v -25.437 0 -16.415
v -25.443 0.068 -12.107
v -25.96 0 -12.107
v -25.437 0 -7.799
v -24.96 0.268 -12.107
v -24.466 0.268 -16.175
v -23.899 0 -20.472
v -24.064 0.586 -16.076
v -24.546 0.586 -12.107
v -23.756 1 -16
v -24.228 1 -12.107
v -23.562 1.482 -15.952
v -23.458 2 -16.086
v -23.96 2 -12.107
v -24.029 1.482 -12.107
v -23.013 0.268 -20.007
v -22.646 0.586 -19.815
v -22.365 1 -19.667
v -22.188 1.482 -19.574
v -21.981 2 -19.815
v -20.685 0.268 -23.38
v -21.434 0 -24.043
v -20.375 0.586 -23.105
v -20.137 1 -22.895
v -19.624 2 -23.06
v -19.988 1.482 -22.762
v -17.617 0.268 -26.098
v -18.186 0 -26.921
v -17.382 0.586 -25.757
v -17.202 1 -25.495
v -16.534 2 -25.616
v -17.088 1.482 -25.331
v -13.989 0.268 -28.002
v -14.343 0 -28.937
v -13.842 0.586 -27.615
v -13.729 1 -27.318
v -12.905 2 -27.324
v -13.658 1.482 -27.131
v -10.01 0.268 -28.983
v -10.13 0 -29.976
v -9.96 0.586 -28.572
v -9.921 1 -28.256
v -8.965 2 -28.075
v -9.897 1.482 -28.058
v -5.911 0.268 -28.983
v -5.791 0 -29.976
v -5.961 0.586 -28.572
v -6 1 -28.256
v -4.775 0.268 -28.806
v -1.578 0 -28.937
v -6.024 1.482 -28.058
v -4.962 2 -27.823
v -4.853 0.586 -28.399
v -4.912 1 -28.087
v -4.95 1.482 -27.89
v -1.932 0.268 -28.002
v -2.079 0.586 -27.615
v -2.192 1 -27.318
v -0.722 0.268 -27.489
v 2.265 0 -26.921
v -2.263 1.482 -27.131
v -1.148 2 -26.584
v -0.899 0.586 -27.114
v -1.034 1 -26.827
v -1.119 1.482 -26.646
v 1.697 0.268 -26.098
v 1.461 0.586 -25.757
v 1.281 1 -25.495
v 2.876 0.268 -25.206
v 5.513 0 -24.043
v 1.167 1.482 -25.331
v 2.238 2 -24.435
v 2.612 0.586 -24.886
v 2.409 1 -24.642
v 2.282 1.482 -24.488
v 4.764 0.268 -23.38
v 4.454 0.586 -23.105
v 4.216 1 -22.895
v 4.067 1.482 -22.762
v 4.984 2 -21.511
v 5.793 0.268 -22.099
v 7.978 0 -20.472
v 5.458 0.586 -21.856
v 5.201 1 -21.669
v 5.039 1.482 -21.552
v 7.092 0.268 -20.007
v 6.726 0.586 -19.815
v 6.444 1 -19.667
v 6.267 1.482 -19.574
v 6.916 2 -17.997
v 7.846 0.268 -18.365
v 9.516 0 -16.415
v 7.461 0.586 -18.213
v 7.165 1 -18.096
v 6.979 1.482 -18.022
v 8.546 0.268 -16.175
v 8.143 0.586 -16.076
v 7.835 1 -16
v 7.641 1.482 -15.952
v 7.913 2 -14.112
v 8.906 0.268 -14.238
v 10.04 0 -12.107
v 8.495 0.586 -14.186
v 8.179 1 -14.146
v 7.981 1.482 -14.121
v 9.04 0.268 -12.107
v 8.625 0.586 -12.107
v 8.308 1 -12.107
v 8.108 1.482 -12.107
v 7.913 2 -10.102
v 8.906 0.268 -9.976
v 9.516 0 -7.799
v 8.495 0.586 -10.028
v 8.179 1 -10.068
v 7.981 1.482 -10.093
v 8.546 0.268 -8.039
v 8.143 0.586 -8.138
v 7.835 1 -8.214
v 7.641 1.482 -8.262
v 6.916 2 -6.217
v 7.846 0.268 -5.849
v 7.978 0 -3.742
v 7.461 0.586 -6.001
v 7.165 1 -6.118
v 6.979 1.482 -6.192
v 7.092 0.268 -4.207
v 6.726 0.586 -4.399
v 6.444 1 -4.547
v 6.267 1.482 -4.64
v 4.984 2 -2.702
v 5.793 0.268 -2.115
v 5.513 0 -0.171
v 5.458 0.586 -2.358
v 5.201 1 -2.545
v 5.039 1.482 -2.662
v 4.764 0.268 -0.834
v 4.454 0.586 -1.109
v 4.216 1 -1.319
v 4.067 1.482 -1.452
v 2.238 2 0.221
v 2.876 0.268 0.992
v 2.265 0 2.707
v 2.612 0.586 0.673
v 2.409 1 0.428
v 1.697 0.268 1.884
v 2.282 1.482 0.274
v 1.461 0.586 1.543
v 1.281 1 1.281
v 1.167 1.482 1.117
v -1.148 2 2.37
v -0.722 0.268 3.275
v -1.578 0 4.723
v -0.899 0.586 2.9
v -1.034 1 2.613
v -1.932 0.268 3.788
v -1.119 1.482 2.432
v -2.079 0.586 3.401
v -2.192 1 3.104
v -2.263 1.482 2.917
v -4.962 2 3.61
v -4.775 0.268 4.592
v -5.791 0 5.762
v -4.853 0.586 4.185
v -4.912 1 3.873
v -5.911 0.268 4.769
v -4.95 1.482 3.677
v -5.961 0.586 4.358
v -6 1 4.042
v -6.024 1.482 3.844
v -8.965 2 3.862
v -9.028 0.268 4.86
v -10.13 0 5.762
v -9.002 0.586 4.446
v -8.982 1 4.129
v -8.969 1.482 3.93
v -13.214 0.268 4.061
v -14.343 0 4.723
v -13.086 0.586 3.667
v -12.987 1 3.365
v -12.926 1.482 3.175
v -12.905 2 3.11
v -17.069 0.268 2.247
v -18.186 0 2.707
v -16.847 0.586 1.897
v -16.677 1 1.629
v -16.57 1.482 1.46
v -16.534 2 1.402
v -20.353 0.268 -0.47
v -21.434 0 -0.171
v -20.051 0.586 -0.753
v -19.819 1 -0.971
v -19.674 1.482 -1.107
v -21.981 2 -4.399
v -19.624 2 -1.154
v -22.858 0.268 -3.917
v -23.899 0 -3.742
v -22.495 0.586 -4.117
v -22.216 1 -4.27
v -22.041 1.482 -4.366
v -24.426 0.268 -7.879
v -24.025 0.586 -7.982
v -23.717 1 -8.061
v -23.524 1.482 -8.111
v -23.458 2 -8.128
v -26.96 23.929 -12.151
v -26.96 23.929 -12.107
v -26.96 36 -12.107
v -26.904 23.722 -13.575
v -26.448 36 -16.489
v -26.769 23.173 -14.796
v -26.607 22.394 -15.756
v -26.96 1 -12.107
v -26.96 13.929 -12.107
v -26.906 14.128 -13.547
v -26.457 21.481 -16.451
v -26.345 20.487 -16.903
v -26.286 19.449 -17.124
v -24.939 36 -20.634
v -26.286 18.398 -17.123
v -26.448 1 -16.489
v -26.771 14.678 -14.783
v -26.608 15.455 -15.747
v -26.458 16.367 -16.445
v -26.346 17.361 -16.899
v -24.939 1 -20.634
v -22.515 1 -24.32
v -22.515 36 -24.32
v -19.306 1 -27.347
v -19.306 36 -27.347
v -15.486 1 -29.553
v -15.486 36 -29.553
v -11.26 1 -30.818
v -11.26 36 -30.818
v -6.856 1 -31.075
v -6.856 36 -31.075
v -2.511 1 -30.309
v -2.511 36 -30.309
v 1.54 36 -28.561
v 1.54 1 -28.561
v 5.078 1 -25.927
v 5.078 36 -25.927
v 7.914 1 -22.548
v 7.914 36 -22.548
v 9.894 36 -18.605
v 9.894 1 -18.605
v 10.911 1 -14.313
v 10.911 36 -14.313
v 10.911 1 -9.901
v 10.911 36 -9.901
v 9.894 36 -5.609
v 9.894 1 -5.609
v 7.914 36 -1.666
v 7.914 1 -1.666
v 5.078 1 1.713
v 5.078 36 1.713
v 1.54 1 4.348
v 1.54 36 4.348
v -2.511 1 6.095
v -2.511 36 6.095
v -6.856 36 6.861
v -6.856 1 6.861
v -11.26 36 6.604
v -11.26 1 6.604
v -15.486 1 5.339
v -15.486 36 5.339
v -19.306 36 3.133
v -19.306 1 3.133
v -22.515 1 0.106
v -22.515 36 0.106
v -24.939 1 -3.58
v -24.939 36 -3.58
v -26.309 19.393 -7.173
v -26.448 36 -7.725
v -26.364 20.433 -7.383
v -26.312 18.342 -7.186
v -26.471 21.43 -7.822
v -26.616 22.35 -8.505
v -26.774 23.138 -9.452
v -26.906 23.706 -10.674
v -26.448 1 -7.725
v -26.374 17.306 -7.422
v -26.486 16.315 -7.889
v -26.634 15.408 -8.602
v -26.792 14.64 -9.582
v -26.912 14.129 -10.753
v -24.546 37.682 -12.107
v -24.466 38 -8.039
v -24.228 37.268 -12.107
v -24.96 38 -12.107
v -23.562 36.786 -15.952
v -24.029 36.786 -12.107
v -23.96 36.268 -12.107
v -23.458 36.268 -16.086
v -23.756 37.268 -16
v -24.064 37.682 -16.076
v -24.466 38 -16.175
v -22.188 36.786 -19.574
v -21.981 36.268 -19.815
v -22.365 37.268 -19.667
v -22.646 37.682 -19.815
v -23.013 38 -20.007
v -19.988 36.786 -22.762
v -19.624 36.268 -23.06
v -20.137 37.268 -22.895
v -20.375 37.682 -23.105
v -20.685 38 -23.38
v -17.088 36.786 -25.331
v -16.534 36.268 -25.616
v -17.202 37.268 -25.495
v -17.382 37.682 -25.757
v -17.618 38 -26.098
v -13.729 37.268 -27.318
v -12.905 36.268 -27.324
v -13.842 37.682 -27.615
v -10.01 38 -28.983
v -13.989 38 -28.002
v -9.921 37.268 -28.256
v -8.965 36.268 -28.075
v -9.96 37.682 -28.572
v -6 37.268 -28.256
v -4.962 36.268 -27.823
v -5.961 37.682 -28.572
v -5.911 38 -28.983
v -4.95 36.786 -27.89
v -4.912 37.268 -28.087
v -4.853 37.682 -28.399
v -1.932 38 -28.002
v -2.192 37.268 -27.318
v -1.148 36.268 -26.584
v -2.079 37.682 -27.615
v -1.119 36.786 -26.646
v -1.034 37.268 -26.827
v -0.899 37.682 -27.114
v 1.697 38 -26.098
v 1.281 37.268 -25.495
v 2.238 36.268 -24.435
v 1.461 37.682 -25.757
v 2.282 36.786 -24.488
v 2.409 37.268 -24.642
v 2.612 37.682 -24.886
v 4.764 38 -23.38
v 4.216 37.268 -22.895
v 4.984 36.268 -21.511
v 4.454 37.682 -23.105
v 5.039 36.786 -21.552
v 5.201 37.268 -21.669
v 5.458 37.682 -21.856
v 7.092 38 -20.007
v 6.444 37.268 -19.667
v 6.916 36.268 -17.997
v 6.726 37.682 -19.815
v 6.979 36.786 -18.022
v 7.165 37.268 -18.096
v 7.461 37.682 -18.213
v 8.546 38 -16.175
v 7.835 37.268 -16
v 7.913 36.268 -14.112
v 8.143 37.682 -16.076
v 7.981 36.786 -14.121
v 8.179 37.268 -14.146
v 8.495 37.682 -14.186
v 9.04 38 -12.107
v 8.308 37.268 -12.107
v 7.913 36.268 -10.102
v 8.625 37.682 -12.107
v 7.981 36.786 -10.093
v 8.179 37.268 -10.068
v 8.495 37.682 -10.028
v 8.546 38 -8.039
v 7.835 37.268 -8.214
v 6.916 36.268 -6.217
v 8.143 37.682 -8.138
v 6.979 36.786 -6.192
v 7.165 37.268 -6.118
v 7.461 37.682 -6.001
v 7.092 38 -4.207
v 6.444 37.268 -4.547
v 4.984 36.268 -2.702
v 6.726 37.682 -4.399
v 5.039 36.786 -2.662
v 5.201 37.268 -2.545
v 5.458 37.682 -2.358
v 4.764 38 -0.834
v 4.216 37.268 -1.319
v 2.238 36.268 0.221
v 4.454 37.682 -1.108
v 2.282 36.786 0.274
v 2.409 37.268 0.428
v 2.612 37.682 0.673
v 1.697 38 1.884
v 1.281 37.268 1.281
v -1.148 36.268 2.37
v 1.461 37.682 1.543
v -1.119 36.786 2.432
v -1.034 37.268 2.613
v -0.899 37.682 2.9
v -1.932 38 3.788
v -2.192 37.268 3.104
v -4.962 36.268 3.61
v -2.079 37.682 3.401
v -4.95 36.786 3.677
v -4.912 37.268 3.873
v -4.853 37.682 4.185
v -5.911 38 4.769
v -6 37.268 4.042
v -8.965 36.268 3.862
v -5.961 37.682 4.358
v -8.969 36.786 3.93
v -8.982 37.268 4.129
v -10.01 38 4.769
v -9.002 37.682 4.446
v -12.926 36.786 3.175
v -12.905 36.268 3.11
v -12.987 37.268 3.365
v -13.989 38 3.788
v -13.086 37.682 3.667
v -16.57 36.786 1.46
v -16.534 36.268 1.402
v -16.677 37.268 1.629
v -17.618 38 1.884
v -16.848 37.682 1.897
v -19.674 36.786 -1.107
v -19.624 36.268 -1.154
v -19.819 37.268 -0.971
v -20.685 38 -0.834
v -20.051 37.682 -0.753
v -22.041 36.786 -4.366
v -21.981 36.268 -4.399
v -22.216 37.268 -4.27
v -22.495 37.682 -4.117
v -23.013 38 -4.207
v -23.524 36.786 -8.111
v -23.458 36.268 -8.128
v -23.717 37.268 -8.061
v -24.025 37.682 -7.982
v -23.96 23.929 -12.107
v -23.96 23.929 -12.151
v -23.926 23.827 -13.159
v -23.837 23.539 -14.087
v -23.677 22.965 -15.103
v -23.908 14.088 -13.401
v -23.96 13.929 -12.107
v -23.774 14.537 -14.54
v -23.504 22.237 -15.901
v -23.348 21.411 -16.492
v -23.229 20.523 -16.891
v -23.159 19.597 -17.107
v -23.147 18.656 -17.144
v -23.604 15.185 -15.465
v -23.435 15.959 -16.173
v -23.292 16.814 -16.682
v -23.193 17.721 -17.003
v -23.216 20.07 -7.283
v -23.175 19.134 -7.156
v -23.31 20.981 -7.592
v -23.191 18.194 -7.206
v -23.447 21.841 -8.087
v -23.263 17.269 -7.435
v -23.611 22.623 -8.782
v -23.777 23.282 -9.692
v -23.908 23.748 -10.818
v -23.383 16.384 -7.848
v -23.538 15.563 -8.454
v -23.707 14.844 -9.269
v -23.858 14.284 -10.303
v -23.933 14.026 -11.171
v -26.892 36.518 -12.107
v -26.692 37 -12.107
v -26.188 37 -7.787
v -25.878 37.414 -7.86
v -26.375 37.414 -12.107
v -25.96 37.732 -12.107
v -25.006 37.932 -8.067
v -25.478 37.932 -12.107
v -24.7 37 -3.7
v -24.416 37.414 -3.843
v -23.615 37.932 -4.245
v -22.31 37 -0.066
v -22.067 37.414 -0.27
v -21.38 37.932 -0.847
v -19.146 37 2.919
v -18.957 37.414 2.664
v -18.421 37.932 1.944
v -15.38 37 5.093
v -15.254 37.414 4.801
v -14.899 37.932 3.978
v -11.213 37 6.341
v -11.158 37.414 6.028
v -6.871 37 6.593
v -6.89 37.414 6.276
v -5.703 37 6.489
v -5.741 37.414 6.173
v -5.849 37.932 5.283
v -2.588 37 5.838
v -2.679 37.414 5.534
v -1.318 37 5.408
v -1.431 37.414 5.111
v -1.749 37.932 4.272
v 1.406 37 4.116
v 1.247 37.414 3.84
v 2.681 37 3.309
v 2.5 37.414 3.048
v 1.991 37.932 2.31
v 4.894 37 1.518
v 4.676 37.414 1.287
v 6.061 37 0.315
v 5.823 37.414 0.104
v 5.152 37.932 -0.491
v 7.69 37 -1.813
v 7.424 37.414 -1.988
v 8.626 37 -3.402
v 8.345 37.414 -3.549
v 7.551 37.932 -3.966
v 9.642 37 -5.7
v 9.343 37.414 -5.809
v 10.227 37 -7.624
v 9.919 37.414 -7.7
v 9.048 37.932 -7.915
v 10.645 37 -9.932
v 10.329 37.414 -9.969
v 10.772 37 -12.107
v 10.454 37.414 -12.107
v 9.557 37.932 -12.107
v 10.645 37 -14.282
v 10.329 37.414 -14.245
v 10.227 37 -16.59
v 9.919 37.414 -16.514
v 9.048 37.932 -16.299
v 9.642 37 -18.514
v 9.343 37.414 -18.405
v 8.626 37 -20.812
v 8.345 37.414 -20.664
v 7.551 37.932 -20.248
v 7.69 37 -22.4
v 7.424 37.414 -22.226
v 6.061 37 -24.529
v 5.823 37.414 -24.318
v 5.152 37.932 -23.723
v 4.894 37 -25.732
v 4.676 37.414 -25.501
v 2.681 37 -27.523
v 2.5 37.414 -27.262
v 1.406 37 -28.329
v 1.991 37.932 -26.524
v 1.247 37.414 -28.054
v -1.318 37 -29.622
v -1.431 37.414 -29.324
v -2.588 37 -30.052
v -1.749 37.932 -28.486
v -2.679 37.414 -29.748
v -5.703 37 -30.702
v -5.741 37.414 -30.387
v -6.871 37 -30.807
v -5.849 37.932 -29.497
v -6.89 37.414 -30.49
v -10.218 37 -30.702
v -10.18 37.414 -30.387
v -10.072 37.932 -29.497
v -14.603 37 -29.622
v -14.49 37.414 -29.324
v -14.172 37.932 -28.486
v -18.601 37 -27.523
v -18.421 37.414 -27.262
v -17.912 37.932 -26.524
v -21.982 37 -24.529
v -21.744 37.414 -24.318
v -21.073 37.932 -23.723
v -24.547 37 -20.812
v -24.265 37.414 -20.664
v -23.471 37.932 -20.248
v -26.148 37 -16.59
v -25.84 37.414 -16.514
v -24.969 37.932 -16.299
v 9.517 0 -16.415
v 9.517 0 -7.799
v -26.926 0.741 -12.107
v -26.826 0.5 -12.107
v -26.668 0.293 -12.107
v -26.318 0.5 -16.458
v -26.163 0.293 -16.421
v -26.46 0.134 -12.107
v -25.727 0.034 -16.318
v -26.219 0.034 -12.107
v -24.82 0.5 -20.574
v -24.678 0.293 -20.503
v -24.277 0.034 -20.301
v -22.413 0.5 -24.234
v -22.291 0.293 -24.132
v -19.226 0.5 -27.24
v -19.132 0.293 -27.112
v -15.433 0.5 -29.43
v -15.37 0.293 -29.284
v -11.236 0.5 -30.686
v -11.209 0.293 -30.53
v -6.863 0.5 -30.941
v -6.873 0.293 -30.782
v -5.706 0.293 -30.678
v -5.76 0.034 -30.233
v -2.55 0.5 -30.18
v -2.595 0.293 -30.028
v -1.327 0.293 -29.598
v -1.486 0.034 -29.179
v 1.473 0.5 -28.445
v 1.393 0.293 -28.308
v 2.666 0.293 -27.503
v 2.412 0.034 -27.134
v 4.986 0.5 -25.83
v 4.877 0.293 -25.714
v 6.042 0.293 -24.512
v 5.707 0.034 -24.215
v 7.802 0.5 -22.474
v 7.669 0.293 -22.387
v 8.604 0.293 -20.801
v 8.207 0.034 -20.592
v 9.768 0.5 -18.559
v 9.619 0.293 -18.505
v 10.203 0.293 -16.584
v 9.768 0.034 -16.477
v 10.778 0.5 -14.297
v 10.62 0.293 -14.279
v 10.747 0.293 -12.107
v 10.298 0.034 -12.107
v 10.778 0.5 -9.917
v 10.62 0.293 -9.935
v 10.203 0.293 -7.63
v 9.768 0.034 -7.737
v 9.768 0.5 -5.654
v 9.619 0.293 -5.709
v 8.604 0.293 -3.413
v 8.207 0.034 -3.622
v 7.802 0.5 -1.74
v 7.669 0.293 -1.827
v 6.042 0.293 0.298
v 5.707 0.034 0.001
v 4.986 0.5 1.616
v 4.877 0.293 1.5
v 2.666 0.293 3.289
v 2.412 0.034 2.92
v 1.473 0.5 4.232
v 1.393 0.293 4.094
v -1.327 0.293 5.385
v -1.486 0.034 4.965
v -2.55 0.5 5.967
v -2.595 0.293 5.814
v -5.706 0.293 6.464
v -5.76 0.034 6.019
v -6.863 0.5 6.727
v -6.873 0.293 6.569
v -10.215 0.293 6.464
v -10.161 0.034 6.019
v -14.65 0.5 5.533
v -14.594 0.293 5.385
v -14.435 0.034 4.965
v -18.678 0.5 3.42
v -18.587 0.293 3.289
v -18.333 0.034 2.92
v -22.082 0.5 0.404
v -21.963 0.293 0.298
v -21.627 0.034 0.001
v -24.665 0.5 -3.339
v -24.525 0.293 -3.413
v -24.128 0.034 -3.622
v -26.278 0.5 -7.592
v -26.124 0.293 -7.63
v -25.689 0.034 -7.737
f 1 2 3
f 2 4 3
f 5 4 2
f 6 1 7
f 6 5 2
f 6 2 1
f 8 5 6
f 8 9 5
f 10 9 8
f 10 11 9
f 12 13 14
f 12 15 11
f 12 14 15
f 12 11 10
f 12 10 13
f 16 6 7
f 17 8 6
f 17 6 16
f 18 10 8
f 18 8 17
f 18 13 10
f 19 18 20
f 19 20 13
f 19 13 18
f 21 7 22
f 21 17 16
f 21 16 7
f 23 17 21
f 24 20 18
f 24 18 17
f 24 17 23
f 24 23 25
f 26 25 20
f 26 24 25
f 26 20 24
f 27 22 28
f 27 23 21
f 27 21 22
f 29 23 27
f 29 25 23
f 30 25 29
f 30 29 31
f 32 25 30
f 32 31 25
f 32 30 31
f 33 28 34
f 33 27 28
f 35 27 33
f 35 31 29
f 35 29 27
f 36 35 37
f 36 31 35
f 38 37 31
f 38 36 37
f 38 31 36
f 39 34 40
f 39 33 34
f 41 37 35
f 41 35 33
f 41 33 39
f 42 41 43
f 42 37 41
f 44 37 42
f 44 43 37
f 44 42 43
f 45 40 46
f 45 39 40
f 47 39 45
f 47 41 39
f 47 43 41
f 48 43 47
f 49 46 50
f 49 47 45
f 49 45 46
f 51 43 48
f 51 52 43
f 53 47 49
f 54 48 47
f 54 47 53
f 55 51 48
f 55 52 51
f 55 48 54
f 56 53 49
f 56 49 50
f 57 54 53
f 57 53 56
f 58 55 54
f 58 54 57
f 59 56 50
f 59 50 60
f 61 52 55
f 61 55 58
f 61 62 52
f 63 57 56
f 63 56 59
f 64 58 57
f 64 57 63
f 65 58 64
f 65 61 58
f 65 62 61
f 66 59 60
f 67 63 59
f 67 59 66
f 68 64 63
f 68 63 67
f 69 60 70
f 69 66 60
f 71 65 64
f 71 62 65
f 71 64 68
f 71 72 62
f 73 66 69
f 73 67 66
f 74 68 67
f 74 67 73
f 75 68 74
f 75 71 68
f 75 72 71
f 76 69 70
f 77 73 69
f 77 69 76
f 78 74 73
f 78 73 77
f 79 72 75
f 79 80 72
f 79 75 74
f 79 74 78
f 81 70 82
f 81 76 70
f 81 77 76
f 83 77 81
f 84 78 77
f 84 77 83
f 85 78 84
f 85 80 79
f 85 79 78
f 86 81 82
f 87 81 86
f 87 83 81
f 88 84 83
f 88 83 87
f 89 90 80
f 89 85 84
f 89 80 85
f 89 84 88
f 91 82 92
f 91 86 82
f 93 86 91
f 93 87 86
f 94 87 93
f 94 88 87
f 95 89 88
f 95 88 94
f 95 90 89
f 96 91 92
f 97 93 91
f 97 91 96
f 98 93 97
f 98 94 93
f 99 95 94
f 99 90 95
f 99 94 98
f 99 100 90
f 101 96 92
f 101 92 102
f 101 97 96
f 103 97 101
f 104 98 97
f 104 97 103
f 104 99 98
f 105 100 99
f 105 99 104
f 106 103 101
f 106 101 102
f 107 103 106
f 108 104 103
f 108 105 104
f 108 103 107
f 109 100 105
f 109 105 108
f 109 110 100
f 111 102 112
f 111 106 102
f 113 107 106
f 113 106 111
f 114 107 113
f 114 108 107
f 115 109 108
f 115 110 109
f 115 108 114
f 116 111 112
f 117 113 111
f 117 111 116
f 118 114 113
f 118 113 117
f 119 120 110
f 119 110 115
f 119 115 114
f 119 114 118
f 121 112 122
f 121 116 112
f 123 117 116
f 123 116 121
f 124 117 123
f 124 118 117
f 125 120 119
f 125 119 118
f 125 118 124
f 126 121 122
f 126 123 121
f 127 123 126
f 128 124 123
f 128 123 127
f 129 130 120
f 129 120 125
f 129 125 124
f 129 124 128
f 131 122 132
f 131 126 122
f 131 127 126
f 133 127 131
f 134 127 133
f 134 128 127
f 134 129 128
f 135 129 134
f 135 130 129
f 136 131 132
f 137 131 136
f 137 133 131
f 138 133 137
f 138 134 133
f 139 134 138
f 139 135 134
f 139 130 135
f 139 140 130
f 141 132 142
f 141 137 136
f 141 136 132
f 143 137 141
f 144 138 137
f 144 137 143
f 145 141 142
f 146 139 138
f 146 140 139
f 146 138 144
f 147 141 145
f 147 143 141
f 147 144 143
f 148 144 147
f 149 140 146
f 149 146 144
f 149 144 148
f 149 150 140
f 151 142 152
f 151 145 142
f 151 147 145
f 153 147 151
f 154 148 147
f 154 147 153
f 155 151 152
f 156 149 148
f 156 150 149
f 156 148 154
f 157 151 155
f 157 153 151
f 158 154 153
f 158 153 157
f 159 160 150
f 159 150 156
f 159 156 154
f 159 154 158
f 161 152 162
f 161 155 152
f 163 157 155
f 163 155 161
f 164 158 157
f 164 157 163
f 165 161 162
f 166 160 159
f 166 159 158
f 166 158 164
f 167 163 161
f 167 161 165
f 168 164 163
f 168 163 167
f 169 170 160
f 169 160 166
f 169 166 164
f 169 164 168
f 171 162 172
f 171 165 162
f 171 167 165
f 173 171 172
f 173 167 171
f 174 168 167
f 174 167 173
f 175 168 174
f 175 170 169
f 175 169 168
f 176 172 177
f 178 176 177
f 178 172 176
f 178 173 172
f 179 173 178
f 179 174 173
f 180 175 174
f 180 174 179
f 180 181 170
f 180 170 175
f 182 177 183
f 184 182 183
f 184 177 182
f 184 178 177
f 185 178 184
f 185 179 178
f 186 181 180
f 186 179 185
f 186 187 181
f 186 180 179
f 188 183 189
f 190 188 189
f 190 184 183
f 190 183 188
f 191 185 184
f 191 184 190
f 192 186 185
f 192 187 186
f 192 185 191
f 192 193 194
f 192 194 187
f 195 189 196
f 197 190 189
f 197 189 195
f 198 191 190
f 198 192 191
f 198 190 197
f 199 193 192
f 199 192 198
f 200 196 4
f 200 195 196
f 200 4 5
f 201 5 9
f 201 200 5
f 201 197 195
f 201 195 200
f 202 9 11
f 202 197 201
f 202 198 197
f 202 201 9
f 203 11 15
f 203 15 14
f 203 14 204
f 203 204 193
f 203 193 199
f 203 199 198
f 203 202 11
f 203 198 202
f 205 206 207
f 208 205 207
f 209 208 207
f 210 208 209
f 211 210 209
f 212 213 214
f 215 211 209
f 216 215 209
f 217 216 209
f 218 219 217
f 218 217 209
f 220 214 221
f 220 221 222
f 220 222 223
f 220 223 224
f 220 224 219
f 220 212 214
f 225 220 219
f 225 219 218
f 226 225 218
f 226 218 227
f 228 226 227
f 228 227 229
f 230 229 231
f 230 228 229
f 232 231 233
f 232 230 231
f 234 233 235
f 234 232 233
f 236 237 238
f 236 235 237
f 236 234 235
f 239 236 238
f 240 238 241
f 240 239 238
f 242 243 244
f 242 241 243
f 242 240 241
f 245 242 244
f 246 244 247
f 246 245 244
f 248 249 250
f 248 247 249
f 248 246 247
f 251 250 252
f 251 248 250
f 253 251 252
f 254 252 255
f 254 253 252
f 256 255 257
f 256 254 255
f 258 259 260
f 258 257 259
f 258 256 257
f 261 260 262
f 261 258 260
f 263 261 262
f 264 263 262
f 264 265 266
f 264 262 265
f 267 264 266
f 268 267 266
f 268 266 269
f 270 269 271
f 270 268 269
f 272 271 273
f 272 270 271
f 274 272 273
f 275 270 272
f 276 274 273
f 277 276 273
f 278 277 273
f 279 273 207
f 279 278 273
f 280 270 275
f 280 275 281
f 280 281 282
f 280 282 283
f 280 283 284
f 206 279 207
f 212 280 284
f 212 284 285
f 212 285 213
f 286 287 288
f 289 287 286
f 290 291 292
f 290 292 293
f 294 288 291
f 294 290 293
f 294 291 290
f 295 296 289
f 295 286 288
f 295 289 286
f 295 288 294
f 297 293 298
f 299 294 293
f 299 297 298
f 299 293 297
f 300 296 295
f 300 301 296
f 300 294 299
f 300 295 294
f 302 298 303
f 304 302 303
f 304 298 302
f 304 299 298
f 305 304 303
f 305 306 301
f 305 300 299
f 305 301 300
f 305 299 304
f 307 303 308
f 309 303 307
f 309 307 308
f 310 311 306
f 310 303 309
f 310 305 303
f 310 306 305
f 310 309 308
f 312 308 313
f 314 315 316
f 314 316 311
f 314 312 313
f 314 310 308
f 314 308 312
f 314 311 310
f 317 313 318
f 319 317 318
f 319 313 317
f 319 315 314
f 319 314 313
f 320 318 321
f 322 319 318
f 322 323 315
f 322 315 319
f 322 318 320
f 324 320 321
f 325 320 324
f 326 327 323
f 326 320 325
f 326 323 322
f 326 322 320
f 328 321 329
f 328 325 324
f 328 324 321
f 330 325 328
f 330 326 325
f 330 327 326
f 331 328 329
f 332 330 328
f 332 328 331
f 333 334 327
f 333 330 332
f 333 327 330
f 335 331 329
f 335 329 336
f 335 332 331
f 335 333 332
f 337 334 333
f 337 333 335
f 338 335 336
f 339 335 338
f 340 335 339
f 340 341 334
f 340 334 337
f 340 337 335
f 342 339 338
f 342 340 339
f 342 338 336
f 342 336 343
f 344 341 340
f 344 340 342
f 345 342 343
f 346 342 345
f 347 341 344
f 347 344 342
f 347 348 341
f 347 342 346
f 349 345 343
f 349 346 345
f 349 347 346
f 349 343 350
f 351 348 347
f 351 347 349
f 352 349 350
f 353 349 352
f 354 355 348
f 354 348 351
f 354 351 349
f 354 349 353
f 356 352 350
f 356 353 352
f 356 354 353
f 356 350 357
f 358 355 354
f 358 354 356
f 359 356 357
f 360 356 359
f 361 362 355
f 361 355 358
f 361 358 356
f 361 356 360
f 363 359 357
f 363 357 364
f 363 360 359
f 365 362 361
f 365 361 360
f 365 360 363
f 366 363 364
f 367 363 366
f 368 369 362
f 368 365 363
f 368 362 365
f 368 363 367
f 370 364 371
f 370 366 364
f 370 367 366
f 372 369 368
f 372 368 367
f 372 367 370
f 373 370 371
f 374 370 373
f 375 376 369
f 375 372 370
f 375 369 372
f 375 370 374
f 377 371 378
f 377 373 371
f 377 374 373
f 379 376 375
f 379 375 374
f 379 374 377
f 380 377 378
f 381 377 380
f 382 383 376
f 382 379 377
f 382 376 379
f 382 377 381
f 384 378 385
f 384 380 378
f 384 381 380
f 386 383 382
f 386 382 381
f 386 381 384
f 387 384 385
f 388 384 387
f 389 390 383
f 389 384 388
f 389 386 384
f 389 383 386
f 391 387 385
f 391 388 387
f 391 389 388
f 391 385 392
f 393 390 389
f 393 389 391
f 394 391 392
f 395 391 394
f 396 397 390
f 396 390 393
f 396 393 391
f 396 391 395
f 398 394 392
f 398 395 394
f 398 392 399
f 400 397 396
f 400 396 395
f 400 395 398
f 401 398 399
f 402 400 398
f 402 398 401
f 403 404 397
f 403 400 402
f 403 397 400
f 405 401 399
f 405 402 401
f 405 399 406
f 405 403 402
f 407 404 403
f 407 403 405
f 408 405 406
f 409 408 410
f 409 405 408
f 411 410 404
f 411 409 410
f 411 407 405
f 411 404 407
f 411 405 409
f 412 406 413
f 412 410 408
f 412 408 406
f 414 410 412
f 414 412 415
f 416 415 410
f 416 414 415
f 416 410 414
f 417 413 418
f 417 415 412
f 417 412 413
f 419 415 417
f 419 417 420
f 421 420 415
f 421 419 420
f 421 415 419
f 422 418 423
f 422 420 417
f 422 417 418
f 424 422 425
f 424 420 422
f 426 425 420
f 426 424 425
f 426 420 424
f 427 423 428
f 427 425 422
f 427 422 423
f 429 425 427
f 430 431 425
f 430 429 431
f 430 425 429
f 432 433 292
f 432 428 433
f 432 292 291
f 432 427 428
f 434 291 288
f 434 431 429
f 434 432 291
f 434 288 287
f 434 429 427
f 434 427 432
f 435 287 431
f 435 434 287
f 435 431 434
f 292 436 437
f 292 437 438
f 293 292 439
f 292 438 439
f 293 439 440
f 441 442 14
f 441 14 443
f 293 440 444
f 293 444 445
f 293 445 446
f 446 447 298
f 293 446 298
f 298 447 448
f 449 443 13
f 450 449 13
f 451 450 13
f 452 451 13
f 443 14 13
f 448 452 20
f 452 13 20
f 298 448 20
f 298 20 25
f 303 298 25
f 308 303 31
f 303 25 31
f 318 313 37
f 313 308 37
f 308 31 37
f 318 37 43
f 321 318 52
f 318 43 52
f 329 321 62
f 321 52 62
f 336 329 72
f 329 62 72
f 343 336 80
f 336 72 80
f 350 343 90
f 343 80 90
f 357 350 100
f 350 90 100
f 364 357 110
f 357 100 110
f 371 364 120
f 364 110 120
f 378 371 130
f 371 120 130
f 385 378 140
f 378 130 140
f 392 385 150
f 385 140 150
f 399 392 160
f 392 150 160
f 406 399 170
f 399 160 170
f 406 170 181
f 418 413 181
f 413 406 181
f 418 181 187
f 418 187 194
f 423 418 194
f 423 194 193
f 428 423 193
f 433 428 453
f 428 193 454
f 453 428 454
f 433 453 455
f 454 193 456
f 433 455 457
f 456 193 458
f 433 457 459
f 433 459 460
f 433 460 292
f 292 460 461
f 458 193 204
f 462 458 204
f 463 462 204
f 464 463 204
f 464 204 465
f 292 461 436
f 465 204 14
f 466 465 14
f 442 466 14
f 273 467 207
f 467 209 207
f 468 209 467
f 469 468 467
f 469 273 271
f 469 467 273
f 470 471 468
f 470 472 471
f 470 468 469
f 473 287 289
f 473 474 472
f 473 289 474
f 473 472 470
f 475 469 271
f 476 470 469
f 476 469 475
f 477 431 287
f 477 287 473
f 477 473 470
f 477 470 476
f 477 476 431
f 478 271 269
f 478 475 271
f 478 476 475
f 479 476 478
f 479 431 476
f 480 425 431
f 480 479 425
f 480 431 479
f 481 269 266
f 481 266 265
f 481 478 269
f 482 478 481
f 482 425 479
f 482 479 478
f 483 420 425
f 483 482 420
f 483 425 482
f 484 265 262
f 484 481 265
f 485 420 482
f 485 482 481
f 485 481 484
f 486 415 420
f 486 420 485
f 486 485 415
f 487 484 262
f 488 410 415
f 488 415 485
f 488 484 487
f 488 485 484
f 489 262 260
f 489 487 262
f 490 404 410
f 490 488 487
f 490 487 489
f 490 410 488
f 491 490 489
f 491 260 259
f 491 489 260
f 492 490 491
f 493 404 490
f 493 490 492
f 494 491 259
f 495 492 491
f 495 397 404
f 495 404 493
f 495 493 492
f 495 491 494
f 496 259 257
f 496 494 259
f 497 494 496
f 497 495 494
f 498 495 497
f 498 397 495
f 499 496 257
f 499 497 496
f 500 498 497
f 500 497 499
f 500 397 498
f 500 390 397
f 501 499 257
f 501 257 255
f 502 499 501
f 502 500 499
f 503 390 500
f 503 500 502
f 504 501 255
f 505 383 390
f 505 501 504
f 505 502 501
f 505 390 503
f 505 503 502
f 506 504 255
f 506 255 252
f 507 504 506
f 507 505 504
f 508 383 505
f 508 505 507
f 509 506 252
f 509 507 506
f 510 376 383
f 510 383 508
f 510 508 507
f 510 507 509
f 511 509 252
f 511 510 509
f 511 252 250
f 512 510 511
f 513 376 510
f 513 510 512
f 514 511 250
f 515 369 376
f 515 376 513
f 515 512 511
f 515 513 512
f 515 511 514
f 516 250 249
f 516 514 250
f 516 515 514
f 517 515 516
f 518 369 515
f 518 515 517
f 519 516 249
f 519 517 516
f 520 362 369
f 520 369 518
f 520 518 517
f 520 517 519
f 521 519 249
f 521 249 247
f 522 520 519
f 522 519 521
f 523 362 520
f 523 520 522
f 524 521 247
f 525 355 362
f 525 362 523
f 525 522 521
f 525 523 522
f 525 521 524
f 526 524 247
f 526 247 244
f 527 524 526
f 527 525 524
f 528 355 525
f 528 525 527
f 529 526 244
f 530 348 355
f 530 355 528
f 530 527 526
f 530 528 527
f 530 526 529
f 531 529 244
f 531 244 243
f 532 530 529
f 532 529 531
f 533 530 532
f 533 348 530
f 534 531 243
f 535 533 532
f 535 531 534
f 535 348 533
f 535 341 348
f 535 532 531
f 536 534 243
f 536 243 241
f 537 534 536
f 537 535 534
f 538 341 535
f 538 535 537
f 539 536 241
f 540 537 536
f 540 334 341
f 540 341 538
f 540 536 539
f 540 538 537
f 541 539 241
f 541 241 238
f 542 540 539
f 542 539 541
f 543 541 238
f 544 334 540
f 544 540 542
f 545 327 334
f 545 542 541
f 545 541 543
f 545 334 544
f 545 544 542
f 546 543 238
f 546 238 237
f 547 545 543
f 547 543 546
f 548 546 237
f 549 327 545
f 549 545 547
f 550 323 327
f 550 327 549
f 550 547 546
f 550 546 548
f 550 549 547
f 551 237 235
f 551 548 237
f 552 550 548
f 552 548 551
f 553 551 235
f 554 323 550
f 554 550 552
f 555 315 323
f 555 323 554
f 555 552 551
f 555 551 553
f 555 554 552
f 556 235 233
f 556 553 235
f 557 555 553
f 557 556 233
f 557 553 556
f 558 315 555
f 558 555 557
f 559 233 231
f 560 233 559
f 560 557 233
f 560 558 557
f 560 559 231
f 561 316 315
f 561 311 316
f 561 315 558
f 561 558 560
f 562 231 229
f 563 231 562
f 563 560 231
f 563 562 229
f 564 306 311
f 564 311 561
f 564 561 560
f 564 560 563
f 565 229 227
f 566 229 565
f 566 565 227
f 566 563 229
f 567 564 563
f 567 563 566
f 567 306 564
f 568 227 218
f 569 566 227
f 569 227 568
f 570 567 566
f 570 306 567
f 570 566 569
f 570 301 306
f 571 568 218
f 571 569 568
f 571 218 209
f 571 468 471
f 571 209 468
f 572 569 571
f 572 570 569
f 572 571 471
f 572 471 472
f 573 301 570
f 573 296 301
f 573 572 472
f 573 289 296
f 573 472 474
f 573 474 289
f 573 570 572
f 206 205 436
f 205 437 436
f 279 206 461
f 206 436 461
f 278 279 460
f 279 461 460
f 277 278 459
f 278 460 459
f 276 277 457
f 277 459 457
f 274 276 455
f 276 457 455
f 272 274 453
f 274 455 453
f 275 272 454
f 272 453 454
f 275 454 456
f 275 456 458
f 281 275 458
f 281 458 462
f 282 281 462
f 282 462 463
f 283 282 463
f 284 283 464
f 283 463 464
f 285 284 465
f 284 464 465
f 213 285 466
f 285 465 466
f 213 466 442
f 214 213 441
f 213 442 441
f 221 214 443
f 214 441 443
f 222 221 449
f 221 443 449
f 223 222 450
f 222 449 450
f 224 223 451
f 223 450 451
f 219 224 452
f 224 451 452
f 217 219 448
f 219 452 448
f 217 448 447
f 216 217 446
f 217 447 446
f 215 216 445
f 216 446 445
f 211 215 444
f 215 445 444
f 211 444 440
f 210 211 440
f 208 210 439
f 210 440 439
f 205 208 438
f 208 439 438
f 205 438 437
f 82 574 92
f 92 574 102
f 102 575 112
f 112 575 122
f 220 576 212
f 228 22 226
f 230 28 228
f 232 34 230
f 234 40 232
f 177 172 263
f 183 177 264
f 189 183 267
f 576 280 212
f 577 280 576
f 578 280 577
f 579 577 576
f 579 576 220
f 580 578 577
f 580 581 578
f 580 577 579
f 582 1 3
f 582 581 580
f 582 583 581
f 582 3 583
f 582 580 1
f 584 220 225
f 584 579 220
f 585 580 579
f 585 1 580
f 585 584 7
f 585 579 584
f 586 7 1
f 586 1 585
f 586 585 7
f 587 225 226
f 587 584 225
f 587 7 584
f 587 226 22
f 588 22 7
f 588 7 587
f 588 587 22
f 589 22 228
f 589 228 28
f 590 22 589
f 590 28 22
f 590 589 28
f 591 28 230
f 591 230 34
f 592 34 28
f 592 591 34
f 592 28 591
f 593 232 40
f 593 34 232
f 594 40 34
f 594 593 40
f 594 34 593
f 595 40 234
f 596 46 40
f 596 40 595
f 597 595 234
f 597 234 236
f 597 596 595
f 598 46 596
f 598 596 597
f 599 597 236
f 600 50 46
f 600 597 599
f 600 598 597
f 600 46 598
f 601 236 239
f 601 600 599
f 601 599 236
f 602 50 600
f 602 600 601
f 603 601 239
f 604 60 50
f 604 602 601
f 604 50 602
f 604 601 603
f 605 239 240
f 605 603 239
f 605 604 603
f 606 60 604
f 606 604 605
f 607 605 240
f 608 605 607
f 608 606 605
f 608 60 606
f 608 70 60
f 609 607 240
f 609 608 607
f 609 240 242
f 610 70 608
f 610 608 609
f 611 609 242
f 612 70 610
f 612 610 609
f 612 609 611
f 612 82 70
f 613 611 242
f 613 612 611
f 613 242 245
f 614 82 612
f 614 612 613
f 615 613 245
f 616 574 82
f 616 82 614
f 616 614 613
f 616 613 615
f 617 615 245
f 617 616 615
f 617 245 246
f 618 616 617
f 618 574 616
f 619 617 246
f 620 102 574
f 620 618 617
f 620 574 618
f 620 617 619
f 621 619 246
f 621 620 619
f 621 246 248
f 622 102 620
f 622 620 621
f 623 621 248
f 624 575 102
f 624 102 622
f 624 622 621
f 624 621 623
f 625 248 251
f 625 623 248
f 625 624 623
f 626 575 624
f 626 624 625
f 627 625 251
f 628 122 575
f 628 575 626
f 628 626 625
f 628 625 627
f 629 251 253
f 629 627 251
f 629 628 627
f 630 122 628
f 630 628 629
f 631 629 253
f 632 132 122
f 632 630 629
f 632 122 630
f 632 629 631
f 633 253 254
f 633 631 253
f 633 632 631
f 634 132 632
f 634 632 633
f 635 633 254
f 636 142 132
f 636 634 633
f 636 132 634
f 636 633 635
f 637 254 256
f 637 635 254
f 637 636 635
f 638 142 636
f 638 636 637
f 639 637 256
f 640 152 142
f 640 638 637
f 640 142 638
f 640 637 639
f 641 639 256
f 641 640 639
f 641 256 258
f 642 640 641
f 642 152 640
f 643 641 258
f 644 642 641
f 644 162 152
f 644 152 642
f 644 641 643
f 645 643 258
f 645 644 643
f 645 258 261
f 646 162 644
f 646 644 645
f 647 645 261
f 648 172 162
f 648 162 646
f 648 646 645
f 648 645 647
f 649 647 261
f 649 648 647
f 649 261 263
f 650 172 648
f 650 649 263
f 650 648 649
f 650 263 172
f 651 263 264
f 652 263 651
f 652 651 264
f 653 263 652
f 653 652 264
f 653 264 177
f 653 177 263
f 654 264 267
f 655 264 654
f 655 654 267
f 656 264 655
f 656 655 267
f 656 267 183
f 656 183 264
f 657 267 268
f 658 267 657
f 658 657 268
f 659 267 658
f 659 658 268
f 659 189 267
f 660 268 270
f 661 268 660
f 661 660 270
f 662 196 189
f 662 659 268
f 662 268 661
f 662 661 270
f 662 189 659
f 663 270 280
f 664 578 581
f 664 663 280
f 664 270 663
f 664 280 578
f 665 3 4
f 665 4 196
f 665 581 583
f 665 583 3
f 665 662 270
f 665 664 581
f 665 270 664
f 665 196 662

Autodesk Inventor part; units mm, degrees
ref_plane "YZ Plane" through (0, 0, 0) normal (1, 0, 0) x (0, 1, 0)
ref_plane "XZ Plane" through (0, 0, 0) normal (0, 1, 0) x (-1, 0, 0)
ref_plane "XY Plane" through (0, 0, 0) normal (0, 0, 1) x (1, 0, 0)
sketch "Sketch1" plane through (0, 0, 0) normal (0, 1, 0) x (-1, 0, 0)
  circle A0 centre (7.9604, -12.1069) radius 19
  circle A1 centre (7.9604, -12.1069) radius 16
  point P0 (0, 0)
  dimension "d0" = 38
  dimension "d1" = 32
extrude "Extrusion1" add sketch "Sketch1" along normal blind 38
fillet "Fillet1" radius 2 2 edges at (11.0396, 38, -12.1069) (8.0396, 38, -12.1069)
fillet "Fillet2" radius 1 1 edges at (11.0396, 0, -12.1069)
fillet "Fillet3" radius 2 1 edges at (8.0396, 0, -12.1069)
sketch "Sketch2" plane through (0, 0, 0) normal (1, 0, 0) x (0, 1, 0)
  line L0 (39.783, 8.7002) -> (-1.9245, -33.003)
  circle A0 centre (18.9293, -12.1514) radius 5
  point P0 (0, 0)
  dimension "d7" = 10
extrude "Extrusion2" cut sketch "Sketch2" against normal blind 38
properties part number "Bucha"
